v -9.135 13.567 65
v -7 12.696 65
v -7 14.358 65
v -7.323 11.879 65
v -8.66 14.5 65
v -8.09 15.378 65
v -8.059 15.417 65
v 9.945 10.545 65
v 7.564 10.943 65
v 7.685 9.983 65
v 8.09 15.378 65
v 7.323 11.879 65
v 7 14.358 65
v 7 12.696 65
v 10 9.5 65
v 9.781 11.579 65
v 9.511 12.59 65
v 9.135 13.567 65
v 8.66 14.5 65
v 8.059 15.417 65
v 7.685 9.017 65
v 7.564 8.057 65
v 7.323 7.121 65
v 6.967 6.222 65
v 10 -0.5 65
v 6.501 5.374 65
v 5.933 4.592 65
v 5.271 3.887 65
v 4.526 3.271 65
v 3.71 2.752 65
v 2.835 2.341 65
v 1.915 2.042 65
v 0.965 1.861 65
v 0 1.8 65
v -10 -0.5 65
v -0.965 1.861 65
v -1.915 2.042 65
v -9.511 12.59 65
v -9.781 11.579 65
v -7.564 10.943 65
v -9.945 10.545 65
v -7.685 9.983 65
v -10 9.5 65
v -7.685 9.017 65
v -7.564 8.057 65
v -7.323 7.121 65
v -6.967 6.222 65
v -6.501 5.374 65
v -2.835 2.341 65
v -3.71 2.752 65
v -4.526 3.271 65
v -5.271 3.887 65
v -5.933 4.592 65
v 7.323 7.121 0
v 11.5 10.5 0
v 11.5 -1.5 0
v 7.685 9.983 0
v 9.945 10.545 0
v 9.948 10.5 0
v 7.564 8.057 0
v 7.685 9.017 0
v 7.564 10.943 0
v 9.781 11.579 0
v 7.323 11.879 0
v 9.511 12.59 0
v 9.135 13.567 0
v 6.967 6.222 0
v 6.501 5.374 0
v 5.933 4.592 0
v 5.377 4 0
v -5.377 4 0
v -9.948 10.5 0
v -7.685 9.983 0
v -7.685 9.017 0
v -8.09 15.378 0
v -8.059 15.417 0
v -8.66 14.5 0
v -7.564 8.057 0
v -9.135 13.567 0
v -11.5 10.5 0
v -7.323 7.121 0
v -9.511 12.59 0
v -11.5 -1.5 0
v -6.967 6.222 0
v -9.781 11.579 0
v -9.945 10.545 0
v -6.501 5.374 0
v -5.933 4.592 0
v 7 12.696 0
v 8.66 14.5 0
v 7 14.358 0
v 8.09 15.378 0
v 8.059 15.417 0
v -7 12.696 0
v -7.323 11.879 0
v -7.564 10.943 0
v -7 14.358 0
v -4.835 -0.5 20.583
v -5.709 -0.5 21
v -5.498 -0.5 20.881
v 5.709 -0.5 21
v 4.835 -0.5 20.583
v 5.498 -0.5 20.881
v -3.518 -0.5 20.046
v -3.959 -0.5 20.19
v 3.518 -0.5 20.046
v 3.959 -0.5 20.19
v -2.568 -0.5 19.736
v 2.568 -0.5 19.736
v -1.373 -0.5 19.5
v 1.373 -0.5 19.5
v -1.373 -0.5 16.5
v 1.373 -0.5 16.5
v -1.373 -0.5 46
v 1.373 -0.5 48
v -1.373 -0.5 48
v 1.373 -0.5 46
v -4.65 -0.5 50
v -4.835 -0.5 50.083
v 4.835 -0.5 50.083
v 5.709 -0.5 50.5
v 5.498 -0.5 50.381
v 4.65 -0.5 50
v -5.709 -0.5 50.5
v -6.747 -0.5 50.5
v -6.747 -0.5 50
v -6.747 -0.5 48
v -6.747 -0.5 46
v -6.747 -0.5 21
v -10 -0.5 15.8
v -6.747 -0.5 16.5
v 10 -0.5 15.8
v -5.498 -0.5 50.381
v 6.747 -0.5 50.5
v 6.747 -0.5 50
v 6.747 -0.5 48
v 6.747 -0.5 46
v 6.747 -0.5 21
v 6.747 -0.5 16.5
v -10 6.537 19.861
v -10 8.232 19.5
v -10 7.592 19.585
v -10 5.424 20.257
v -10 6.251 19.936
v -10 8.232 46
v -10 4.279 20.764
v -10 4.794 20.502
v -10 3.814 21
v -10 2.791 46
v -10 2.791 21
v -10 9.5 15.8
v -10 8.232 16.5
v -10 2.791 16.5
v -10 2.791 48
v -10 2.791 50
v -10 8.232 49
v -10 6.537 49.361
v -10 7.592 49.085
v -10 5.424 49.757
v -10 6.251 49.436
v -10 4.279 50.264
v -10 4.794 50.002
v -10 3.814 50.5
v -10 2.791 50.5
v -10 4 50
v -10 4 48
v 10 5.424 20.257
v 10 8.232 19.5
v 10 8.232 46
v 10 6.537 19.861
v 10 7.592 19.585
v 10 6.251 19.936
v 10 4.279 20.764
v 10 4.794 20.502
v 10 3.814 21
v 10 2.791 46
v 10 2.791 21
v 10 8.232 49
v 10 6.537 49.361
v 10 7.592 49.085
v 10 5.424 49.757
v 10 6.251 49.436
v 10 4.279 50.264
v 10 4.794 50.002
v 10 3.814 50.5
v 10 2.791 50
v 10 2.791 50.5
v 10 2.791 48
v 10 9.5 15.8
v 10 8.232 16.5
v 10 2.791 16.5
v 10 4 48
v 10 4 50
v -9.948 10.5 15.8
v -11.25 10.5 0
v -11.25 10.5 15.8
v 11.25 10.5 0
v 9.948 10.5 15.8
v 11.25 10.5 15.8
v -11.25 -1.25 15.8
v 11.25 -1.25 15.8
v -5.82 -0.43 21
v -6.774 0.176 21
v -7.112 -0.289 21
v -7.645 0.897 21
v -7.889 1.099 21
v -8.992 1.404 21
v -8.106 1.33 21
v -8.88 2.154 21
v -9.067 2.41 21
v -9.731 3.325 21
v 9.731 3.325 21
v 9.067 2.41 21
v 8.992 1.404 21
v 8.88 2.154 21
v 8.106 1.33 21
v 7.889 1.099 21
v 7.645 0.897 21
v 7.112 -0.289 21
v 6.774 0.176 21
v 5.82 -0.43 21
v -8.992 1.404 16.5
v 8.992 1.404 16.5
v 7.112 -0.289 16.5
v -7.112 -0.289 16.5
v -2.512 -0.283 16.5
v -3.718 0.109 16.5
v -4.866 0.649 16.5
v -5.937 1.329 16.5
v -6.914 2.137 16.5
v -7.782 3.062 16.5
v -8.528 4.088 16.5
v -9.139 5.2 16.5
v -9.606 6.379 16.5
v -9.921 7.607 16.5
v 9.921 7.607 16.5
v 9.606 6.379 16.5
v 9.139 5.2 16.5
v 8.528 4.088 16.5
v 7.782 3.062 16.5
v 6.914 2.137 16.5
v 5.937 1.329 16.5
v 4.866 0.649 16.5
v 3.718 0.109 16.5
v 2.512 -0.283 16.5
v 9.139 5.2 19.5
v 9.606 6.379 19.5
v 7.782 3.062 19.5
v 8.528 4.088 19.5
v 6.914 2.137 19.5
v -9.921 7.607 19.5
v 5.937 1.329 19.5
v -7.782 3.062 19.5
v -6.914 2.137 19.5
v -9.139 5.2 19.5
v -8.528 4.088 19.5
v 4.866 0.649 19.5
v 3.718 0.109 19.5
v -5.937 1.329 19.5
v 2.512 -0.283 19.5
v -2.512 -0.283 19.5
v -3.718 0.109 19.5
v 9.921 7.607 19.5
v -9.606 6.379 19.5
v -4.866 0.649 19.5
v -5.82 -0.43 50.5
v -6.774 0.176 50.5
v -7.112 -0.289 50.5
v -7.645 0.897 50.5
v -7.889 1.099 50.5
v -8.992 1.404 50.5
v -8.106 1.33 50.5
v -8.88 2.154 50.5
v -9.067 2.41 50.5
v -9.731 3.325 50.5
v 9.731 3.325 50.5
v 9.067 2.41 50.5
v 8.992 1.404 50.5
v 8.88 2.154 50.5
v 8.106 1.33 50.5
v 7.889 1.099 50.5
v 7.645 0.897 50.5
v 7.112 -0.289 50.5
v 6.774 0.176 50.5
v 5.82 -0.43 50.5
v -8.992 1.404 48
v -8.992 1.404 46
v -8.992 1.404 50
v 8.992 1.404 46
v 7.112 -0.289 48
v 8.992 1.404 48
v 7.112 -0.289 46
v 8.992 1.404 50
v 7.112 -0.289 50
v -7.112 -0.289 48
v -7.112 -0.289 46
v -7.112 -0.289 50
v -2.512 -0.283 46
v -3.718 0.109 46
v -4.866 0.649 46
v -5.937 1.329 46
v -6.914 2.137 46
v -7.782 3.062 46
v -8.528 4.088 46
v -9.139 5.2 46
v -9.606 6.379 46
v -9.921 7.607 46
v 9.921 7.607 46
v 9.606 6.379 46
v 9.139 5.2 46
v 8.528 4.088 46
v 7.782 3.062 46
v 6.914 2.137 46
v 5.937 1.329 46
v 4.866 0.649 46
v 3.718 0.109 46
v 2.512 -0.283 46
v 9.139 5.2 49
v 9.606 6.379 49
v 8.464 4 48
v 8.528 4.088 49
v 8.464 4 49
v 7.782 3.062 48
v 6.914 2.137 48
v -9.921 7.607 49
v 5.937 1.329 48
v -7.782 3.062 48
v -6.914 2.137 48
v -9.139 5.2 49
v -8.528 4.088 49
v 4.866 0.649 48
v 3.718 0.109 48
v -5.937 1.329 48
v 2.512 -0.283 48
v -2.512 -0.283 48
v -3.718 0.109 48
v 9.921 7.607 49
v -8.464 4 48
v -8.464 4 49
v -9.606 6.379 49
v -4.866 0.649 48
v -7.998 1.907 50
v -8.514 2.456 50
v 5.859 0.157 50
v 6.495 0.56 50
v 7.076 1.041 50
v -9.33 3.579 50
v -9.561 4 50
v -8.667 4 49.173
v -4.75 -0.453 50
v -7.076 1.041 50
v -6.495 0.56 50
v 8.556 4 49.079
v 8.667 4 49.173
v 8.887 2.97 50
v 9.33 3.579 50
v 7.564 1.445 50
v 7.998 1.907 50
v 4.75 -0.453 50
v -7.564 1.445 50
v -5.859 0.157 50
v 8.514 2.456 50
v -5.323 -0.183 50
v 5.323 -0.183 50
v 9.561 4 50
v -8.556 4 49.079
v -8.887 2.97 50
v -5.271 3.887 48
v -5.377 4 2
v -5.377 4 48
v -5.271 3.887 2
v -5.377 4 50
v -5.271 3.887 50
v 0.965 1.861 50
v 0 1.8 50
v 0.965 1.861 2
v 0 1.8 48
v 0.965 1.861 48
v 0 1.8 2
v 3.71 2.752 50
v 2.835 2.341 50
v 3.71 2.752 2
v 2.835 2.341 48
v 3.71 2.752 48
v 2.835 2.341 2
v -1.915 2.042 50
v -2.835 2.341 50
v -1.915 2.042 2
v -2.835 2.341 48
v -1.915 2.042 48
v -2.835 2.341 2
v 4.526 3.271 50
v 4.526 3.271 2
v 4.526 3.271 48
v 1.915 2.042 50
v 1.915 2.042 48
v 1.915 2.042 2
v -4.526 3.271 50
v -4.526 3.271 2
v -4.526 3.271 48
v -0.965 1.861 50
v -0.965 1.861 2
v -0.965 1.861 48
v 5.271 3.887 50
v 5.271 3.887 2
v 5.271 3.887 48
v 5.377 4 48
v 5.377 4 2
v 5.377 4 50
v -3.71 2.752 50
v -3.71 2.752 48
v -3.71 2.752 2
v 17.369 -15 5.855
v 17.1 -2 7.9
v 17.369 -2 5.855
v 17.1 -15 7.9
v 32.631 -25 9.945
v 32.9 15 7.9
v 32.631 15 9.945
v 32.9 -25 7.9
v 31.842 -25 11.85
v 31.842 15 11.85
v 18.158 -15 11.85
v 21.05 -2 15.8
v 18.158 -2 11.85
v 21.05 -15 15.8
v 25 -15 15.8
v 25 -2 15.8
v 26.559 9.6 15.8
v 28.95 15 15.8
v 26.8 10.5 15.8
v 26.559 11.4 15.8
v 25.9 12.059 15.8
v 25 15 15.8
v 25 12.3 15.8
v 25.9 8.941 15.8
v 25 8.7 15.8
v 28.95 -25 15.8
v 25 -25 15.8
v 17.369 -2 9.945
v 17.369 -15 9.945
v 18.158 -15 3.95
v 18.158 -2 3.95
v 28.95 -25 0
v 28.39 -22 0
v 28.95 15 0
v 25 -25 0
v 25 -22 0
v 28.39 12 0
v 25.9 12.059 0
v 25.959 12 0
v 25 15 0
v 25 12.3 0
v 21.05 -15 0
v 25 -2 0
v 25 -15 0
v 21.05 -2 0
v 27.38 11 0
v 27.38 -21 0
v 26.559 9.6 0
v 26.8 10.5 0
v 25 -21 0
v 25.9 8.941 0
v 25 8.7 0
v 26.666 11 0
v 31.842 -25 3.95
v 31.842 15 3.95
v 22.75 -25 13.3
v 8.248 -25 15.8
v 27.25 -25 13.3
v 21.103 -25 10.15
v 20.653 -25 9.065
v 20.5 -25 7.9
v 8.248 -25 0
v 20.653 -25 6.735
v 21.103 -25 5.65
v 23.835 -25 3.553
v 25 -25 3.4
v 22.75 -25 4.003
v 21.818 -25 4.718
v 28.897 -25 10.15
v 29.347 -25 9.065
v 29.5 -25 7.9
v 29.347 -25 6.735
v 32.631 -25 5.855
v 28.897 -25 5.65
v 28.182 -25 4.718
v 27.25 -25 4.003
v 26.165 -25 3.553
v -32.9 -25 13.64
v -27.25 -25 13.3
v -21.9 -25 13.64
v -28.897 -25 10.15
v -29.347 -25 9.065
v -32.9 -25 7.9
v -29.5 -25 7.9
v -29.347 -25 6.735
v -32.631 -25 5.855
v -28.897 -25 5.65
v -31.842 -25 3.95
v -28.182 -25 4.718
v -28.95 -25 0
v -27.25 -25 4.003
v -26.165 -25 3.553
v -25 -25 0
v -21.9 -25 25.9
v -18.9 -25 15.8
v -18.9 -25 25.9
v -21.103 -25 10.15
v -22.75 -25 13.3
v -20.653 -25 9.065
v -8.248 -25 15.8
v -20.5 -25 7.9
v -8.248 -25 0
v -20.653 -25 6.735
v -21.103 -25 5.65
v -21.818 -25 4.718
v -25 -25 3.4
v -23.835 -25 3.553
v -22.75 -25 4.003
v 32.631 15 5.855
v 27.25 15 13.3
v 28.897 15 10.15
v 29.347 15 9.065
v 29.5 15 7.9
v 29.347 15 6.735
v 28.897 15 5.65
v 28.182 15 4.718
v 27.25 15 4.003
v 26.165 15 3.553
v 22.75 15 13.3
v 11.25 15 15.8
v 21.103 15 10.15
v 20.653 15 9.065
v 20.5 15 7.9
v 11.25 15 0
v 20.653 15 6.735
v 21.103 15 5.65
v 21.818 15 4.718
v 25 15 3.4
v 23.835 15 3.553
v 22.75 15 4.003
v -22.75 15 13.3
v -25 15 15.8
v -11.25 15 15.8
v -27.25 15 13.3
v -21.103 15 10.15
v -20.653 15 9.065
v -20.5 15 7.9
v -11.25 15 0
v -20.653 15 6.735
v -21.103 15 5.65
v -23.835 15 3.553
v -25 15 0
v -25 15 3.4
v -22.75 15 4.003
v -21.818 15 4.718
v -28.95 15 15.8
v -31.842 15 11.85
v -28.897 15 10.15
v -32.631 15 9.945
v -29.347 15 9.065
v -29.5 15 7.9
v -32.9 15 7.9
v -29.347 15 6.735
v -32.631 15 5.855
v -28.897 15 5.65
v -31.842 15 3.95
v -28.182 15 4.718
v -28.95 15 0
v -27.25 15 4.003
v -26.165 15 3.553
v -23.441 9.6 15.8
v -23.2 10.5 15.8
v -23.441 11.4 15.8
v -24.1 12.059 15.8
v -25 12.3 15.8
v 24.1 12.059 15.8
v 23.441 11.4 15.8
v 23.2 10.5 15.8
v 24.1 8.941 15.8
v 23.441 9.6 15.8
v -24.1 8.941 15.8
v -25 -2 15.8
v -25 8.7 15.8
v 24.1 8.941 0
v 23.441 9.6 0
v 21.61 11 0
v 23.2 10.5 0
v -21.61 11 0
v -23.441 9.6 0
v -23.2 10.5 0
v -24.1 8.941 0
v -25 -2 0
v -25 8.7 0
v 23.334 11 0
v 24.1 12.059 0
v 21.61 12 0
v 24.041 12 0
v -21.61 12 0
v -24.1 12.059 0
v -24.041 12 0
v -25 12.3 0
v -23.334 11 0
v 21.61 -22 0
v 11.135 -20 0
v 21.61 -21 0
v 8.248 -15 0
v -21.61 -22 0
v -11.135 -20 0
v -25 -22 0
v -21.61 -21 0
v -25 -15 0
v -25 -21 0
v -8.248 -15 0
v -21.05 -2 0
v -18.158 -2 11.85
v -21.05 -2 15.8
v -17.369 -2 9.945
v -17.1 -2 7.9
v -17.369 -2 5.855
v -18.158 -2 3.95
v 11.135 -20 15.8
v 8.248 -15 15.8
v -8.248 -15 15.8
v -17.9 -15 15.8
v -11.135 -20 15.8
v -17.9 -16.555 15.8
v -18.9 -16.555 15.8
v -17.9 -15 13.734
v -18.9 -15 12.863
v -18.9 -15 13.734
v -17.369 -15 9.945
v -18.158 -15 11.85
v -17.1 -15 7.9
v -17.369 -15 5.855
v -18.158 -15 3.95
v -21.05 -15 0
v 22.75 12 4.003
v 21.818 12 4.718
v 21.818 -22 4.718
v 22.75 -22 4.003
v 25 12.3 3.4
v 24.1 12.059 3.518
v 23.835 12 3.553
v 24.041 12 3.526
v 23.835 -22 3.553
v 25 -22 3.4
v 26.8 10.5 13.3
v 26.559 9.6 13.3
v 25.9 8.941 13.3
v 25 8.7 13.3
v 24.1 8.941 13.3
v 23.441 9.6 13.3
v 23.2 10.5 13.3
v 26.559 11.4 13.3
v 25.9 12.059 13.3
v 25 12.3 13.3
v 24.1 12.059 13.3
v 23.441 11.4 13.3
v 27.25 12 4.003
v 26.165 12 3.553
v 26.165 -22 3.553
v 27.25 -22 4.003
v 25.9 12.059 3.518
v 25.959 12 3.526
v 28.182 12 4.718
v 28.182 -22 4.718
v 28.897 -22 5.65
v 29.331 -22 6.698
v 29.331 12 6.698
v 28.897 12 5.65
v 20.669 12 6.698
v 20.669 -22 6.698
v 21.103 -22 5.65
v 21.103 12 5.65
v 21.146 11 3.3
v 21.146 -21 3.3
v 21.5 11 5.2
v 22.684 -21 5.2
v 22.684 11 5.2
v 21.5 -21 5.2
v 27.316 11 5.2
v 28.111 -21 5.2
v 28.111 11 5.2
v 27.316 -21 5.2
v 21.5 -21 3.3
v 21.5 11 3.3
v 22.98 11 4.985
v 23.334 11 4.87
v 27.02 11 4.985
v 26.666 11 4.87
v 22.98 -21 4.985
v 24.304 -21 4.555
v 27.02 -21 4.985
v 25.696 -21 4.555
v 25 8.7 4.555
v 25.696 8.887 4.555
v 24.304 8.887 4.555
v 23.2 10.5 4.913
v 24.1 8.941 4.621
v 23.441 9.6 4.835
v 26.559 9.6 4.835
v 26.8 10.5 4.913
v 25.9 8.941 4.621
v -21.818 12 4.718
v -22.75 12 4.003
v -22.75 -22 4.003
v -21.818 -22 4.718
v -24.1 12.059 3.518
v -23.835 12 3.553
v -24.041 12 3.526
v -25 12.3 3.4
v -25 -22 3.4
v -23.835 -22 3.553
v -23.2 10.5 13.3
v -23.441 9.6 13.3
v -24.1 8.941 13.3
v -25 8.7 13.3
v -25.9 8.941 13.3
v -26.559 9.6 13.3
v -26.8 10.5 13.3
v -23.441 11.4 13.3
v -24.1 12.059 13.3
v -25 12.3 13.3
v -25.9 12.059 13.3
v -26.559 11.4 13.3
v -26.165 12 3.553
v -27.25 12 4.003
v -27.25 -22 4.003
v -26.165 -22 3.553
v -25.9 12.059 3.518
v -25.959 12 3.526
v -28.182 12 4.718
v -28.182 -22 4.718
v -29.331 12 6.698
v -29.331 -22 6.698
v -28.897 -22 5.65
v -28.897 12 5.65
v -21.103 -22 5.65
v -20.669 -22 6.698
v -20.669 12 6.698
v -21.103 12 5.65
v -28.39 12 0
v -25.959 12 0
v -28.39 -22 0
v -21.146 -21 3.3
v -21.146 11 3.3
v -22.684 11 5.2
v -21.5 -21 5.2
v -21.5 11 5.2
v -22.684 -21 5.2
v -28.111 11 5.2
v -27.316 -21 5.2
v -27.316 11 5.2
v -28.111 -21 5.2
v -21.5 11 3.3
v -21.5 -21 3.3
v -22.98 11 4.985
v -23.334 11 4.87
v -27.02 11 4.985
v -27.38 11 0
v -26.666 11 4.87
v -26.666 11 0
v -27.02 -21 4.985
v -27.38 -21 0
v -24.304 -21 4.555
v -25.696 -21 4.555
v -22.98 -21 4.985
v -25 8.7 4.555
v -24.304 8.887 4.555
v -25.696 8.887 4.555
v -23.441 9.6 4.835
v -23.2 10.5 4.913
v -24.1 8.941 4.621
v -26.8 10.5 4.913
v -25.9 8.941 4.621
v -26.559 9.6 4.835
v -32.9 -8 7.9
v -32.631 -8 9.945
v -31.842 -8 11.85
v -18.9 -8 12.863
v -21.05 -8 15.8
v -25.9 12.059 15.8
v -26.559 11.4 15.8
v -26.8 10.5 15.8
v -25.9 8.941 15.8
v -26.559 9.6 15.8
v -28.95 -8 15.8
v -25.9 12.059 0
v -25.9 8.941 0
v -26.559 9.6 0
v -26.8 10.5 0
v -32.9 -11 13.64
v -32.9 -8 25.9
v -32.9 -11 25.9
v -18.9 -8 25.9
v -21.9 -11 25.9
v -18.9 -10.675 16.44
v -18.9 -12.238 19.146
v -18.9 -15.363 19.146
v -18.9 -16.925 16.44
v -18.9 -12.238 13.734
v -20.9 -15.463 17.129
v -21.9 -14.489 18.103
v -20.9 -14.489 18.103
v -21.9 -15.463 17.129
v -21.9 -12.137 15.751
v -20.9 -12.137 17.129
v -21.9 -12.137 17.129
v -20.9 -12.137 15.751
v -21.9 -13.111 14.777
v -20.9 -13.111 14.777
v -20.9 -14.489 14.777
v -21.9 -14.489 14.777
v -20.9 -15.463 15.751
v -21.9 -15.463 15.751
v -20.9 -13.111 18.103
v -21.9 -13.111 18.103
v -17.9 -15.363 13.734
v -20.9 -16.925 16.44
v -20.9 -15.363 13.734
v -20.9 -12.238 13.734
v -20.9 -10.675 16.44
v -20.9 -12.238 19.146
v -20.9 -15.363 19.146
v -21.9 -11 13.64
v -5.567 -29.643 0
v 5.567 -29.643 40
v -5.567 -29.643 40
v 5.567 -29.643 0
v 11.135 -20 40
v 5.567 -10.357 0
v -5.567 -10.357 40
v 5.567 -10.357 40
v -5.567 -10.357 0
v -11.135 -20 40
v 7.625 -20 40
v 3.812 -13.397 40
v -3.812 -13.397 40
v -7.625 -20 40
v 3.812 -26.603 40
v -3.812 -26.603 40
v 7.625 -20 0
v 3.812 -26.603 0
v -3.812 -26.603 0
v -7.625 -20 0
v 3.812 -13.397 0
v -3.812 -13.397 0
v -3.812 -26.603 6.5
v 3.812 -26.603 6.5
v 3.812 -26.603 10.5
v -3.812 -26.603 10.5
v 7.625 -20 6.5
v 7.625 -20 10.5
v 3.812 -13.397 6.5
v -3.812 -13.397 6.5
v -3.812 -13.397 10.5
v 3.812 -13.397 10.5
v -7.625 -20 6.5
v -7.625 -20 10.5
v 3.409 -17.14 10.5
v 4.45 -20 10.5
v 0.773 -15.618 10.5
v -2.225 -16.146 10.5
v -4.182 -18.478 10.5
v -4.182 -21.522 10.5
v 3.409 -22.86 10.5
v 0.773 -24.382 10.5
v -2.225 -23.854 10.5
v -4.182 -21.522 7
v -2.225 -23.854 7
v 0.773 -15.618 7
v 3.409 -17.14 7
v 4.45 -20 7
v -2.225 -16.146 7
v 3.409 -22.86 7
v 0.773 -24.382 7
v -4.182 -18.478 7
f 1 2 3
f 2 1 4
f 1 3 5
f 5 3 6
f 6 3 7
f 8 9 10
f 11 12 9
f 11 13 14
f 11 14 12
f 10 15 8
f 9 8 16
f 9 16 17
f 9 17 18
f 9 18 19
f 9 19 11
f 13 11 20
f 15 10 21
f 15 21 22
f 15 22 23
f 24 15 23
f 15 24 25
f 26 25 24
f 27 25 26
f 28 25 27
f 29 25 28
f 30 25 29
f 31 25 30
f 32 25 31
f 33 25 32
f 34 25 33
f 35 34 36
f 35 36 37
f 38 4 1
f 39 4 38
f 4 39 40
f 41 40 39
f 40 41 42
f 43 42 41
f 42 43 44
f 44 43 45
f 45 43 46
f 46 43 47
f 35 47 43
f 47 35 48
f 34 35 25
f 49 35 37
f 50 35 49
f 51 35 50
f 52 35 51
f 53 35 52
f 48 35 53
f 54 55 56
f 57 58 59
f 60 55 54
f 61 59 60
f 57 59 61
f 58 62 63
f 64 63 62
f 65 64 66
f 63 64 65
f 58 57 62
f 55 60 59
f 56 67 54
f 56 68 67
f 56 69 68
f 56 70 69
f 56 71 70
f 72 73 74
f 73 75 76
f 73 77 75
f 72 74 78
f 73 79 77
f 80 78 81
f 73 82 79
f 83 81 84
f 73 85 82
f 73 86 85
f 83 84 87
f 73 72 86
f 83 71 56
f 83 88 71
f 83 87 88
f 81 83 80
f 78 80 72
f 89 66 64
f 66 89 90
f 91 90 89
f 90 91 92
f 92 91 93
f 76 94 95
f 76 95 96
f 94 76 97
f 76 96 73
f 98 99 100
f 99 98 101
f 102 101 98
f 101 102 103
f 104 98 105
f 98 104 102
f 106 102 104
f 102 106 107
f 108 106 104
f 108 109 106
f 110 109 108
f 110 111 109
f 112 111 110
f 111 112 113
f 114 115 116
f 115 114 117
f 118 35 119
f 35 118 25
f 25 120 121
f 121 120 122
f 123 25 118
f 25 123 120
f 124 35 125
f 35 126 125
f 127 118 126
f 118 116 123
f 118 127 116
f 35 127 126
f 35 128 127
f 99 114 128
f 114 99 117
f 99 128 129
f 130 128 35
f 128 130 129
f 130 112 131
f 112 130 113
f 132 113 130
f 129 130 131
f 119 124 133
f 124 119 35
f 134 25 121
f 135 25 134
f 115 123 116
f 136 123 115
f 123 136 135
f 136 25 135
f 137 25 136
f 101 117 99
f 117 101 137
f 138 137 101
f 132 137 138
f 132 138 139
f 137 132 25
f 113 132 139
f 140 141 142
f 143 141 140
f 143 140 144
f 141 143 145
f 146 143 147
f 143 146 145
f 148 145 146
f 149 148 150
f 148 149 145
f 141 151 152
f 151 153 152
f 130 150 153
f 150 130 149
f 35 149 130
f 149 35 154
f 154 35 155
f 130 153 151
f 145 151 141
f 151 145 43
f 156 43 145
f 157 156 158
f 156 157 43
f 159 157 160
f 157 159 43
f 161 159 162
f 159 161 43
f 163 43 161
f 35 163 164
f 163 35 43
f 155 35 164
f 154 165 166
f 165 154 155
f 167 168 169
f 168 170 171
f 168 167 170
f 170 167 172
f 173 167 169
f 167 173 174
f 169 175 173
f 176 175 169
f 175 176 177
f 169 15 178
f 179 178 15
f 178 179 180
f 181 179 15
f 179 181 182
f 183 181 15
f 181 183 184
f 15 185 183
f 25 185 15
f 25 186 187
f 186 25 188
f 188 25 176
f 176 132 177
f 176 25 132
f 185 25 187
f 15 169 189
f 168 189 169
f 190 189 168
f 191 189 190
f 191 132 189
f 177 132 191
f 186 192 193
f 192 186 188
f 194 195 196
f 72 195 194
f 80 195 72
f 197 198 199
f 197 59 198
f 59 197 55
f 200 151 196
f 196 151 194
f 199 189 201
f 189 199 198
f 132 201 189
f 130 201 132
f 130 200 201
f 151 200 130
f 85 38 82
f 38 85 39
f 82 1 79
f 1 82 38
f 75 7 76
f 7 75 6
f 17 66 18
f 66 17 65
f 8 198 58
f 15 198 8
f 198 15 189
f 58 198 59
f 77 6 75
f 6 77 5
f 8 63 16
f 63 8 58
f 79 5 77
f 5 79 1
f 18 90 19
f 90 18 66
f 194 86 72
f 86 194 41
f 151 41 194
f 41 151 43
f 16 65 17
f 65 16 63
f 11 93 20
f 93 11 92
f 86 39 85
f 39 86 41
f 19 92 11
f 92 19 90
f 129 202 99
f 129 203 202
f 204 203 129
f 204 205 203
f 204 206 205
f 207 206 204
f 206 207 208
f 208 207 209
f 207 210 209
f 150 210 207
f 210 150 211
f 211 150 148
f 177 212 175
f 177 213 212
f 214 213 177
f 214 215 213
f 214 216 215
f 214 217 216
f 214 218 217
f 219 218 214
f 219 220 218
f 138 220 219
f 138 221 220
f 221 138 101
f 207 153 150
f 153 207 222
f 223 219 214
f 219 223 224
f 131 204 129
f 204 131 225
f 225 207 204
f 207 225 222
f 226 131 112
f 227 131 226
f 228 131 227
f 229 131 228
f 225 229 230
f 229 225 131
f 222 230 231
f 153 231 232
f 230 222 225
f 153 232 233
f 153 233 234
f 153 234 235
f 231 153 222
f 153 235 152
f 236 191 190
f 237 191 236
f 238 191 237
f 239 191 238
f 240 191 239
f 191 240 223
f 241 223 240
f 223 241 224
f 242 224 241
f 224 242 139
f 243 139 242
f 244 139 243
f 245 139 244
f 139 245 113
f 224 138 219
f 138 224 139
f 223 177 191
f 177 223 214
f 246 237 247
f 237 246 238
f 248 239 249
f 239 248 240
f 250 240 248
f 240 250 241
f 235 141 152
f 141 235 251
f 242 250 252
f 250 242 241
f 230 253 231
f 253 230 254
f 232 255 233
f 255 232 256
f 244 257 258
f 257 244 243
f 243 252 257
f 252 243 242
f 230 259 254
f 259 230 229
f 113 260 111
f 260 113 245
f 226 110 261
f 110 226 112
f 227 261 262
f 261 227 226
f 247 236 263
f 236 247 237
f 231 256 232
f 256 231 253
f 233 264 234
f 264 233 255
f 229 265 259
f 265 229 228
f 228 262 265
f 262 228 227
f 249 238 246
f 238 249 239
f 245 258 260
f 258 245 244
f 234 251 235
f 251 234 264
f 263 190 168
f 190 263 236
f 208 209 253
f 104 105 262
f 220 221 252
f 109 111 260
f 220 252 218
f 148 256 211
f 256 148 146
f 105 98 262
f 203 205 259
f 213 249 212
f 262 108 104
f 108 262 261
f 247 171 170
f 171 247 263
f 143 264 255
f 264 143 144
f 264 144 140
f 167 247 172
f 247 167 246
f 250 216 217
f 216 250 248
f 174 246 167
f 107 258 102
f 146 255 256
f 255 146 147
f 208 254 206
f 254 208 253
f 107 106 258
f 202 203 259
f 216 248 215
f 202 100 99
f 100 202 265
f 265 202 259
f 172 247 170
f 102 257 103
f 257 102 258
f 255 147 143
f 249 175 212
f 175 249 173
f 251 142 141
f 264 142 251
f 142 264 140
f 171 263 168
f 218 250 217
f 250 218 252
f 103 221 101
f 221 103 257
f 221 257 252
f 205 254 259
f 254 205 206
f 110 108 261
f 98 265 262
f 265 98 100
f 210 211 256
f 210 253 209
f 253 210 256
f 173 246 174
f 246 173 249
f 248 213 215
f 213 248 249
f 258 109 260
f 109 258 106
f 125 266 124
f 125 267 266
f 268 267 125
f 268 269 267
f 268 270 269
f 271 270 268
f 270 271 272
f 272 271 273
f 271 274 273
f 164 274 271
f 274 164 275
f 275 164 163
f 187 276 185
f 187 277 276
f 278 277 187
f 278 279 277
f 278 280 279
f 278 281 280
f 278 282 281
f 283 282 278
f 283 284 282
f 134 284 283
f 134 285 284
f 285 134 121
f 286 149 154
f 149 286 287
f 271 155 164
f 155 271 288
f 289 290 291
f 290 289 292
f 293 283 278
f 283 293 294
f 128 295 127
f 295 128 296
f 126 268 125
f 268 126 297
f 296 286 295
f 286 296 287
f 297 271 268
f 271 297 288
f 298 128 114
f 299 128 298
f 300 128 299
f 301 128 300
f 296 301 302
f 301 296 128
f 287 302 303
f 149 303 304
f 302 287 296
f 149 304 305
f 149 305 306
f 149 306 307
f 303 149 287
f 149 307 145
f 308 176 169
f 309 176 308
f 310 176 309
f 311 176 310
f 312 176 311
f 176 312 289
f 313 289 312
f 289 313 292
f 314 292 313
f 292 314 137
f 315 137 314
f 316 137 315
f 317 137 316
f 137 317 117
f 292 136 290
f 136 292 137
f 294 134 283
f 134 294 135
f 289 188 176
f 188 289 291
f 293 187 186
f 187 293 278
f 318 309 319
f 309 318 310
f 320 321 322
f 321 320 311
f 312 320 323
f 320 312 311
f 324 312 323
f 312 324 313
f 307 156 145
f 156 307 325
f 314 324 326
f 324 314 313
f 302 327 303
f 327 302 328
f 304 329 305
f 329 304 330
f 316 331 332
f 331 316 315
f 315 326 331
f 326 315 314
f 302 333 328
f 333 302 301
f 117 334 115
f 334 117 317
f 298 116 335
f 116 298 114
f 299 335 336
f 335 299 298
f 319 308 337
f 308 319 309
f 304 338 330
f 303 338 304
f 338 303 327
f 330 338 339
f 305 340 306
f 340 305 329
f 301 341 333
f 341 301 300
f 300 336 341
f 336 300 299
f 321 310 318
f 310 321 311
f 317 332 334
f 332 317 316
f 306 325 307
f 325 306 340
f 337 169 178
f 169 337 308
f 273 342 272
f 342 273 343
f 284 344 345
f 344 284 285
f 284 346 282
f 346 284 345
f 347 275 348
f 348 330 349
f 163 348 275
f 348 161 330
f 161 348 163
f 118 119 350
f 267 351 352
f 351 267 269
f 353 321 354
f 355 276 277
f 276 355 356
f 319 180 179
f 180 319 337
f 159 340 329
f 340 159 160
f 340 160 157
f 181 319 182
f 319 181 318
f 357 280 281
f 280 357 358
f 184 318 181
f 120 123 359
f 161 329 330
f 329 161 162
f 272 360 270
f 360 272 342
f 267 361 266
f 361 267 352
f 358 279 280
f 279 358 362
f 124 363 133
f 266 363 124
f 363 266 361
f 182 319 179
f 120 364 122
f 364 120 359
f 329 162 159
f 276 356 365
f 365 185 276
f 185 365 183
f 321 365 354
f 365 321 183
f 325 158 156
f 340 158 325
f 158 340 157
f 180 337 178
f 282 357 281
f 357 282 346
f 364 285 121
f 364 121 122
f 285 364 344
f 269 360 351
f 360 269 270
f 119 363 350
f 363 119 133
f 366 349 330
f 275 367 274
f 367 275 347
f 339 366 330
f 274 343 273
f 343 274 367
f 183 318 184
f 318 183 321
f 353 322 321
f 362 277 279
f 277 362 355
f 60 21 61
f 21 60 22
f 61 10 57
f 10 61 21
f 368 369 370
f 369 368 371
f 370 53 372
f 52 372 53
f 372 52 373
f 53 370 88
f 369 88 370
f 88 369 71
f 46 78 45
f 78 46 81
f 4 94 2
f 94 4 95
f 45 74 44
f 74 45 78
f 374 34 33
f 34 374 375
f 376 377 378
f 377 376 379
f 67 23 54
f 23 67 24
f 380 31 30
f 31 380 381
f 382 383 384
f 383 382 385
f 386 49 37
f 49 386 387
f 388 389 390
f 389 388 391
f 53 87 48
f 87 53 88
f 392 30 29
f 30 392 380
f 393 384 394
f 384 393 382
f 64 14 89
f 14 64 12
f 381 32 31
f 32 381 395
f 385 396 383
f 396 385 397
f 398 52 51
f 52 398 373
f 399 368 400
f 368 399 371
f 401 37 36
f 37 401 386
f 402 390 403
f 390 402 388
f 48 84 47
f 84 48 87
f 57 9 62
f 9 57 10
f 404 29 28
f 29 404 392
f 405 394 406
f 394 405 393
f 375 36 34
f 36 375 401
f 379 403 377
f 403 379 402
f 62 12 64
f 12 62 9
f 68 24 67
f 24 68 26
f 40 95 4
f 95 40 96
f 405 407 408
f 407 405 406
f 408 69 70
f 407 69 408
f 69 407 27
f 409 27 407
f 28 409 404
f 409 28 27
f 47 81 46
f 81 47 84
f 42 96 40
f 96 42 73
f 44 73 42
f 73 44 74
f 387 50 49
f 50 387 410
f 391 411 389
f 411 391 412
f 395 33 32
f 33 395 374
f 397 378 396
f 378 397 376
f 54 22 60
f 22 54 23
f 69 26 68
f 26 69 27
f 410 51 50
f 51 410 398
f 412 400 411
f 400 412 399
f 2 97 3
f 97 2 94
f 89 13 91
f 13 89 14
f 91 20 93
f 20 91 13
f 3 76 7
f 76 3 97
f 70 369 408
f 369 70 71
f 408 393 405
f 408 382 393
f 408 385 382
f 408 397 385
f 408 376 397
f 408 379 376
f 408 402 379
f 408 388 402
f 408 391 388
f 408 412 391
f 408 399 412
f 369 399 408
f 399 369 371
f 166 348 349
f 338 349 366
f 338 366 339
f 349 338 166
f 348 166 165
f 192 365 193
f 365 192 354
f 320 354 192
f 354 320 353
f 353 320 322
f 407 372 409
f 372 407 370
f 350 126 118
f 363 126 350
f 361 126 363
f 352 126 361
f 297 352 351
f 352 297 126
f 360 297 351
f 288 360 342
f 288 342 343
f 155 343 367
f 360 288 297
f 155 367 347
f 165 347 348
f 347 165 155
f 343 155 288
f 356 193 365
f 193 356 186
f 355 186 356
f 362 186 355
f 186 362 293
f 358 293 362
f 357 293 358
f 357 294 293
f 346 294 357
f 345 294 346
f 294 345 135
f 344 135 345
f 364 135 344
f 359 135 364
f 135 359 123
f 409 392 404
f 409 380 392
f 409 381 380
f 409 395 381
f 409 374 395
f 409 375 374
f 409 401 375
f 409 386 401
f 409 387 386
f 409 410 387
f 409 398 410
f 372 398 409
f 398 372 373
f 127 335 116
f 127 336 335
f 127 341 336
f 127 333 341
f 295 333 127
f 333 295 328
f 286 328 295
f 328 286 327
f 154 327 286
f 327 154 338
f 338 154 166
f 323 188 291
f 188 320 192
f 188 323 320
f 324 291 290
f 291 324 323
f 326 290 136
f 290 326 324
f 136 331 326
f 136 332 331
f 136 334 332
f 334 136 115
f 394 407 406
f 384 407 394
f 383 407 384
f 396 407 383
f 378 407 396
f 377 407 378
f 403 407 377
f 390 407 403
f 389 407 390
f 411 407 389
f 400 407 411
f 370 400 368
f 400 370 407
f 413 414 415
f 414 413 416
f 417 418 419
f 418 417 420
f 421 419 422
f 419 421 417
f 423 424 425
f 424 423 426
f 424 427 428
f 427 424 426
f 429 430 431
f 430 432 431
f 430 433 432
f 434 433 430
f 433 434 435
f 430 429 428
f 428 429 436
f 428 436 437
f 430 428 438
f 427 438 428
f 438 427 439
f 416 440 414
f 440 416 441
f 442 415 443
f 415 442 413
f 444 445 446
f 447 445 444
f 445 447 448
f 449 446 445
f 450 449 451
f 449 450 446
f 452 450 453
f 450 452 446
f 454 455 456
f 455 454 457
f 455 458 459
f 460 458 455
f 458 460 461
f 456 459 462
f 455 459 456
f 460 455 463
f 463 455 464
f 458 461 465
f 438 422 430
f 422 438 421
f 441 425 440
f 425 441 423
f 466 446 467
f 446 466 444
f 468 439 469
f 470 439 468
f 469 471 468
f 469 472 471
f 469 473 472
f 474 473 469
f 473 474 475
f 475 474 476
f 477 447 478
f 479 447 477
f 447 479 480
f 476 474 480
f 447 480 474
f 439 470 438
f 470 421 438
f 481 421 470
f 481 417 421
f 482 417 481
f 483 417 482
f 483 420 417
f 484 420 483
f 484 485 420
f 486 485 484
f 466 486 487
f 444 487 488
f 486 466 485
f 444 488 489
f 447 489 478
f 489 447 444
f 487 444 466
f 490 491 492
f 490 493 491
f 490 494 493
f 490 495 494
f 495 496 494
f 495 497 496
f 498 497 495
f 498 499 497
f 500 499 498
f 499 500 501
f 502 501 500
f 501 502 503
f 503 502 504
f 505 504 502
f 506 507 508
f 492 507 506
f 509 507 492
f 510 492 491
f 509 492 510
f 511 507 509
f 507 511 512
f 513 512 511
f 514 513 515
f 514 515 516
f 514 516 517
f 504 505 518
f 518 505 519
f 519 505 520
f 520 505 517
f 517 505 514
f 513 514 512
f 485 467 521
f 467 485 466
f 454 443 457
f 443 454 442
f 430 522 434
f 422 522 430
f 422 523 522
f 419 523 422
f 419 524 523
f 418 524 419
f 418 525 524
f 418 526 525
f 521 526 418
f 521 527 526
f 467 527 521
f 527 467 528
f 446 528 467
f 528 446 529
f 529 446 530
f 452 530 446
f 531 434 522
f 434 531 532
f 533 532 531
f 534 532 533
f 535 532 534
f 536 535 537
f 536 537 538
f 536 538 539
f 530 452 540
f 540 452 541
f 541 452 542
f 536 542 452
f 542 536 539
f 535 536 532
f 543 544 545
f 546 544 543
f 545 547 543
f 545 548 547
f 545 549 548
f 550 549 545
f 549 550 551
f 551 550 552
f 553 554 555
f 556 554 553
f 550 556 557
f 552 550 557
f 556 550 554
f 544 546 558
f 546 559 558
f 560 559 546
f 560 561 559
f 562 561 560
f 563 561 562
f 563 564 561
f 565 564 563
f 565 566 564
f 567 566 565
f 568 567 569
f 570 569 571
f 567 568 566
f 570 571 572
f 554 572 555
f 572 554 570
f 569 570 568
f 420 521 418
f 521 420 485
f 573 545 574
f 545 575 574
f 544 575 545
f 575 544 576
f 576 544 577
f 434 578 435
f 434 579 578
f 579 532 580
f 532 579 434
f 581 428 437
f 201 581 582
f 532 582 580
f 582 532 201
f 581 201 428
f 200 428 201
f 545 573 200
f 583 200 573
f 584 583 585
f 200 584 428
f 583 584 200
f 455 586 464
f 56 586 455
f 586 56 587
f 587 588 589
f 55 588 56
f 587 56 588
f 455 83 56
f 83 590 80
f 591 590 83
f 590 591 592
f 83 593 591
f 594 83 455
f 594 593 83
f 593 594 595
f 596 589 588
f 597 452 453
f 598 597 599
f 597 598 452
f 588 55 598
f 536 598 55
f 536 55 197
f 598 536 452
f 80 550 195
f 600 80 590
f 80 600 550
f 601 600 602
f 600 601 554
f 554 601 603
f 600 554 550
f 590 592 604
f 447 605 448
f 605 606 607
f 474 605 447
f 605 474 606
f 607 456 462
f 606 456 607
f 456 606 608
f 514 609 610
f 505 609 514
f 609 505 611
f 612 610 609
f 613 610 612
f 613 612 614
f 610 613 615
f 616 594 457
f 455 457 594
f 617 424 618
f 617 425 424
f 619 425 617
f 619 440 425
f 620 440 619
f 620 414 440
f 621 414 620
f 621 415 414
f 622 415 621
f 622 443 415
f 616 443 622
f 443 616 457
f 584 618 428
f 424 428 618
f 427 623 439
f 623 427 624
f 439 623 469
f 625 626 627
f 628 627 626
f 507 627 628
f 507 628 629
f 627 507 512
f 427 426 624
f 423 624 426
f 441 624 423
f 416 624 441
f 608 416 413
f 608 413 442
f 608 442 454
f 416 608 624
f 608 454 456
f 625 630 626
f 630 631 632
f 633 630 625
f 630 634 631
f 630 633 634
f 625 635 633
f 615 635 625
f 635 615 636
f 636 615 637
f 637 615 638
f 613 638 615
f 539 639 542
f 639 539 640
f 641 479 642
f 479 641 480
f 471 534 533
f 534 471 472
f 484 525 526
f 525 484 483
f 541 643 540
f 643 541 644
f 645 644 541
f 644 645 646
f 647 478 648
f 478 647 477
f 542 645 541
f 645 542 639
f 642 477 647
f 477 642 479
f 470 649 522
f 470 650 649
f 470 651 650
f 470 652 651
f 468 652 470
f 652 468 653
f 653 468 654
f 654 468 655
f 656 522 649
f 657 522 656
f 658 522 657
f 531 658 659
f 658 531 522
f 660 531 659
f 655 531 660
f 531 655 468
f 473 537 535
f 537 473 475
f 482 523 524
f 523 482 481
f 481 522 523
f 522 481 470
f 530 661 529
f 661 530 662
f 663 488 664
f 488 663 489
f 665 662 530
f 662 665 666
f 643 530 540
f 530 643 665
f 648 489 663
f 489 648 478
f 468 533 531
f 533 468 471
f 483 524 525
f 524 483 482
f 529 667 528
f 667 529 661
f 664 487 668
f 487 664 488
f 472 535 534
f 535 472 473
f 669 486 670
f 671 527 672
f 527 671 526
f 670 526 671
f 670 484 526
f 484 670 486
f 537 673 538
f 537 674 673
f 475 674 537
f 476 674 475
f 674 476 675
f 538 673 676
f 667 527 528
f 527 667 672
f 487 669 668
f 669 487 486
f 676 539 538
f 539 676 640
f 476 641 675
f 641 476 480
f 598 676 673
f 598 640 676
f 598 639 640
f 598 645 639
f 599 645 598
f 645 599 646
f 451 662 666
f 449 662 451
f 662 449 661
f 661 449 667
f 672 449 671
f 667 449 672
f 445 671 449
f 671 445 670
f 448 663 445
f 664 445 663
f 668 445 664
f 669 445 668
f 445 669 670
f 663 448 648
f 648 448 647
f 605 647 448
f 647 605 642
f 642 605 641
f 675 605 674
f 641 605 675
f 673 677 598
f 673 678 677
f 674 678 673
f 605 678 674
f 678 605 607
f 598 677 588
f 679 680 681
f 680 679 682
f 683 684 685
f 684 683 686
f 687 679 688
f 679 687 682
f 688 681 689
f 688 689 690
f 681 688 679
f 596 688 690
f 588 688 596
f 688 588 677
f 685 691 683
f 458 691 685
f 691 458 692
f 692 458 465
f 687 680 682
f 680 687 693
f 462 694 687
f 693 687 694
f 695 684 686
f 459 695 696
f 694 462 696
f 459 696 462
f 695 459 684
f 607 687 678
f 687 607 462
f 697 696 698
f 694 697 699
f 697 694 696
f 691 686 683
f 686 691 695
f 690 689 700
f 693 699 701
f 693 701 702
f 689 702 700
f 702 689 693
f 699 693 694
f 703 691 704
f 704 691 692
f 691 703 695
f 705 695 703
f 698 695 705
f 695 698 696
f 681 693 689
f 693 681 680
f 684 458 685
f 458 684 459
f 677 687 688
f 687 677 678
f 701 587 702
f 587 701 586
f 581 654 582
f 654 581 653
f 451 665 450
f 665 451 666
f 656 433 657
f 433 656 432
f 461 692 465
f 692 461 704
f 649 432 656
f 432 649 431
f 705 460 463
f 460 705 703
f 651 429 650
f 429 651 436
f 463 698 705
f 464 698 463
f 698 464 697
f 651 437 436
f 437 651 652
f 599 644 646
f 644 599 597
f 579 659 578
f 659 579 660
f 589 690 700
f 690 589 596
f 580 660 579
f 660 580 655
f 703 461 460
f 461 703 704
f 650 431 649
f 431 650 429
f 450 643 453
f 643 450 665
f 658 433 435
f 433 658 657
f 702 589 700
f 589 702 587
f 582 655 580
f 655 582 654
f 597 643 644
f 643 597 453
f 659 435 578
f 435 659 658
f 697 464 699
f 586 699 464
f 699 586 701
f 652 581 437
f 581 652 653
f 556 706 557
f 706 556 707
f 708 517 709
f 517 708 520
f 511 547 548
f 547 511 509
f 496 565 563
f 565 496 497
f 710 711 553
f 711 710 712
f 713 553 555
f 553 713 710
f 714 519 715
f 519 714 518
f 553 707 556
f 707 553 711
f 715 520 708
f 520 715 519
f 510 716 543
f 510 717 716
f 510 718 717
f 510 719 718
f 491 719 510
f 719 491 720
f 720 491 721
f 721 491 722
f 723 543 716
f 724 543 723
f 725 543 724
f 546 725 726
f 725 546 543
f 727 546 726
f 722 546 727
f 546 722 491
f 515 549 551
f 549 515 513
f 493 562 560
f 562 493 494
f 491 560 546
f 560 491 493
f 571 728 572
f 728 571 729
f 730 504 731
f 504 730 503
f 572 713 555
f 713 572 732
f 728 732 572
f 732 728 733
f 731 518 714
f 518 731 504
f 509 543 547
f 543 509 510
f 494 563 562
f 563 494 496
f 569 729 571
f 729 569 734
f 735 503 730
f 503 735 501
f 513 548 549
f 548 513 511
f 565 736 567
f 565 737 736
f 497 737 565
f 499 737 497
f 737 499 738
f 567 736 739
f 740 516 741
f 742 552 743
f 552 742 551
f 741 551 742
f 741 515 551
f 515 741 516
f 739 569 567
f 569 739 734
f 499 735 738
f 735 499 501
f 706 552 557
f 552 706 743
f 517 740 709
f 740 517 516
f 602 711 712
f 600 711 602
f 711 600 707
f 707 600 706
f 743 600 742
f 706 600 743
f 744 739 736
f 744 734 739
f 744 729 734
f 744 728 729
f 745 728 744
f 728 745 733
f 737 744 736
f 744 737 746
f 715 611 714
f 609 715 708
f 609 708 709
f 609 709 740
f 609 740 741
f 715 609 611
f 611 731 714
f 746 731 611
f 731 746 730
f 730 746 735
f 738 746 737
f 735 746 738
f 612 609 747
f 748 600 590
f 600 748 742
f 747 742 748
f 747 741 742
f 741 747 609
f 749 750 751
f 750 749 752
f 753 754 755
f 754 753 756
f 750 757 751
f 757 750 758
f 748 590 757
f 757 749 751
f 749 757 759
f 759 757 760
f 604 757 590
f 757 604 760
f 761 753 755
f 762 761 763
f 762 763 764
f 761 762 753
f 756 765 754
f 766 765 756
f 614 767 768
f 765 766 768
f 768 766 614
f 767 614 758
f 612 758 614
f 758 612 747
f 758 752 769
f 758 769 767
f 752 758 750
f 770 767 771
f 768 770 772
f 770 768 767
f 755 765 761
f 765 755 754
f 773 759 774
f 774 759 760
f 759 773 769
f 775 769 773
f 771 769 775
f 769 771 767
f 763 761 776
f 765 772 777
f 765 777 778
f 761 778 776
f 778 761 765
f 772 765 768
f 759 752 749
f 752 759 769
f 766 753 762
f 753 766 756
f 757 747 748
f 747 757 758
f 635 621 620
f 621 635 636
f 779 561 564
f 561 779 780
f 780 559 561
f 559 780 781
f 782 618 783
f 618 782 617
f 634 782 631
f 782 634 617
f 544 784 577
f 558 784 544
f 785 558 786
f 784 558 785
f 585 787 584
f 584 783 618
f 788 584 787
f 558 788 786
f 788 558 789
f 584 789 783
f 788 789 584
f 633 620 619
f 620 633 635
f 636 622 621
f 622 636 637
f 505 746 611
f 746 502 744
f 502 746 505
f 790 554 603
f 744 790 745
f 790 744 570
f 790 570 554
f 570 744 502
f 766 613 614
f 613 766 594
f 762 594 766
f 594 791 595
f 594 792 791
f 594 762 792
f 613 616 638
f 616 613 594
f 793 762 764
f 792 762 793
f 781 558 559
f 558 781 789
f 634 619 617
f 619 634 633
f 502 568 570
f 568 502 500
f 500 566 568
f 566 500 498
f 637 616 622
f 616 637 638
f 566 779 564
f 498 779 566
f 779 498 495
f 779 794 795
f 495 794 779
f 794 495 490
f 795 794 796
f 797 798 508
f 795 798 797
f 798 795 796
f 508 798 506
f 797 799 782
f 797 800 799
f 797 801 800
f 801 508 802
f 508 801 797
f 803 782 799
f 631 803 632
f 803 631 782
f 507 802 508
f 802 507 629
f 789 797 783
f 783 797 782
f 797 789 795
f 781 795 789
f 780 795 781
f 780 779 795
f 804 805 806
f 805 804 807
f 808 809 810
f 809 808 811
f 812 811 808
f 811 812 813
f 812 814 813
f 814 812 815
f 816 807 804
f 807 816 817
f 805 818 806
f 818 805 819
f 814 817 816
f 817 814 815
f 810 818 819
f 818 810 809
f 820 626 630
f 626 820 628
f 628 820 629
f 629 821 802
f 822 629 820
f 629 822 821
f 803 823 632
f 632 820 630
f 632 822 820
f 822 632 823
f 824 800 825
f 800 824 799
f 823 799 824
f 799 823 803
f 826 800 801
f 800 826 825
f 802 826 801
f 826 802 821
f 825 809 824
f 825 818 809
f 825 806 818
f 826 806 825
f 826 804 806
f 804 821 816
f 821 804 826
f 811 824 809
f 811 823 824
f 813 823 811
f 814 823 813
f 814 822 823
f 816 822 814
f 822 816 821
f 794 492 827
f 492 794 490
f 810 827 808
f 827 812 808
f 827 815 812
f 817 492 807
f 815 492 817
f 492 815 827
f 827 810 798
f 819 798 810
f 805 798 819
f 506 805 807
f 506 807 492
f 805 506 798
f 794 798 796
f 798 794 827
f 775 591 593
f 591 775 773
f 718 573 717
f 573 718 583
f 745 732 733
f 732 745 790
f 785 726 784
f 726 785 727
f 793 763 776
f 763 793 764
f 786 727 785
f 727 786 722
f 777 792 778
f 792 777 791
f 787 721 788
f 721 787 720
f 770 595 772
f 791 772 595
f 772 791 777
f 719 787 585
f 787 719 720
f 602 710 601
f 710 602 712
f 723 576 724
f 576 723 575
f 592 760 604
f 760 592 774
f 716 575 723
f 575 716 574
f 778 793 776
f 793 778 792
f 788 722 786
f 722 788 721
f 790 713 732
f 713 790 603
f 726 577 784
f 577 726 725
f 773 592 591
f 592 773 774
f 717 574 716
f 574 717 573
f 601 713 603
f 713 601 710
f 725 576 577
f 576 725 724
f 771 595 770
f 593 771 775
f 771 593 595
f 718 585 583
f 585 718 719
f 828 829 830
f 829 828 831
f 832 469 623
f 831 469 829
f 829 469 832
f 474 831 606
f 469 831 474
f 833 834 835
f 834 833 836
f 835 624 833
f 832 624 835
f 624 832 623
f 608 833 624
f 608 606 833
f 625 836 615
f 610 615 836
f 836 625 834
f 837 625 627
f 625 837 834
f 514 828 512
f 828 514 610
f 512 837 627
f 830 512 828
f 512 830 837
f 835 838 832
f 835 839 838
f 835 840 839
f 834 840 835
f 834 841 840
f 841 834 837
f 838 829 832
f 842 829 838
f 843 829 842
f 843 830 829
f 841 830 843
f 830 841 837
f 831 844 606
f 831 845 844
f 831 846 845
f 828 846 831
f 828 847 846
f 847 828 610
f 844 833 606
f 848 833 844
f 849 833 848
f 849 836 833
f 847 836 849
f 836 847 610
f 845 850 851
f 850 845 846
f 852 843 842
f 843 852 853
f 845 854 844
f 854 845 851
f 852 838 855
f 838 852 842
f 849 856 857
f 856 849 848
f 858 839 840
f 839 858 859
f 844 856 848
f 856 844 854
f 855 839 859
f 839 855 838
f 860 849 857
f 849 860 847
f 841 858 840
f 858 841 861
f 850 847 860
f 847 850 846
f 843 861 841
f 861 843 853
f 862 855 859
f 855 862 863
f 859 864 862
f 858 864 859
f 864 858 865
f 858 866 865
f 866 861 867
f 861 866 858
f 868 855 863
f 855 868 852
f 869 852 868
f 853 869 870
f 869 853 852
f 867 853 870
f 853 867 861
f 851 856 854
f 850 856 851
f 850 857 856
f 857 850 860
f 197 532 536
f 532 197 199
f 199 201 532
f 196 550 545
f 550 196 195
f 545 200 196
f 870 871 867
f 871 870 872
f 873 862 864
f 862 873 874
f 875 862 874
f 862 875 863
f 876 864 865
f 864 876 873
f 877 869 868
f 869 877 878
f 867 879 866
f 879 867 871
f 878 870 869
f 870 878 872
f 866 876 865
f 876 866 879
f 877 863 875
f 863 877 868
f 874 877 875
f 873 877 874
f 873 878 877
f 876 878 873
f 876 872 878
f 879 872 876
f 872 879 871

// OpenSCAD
// file: functions.scad
// PRUSA Mendel  
// Functions used in many files
// GNU GPL v2
// Josef Průša
// josefprusa@me.com
// prusadjs.cz
// http://www.reprap.org/wiki/Prusa_Mendel
// http://github.com/prusajr/PrusaMendel

module nut(d,h,horizontal=true){
cornerdiameter =  (d / 2) / cos (180 / 6);
cylinder(h = h, r = cornerdiameter, $fn = 6);
if(horizontal){
for(i = [1:6]){
	rotate([0,0,60*i]) translate([-cornerdiameter-0.2,0,0]) rotate([0,0,-45]) cube(size = [2,2,h]);
}}
}

// By nophead
module polyhole(d,h) {
    n = max(round(2 * d),3);
    rotate([0,0,180])
        cylinder(h = h, r = (d / 2) / cos (180 / n), $fn = n);
}




module roundcorner(diameter){
	difference(){
		cube(size = [diameter,diameter,99], center = false);
		translate(v = [diameter, diameter, 0]) cylinder(h = 100, r=diameter, center=true);
	}
}
// file: metric.scad
// PRUSA Mendel  
// Default metric sizes
// GNU GPL v2
// Josef Průša
// josefprusa@me.com
// prusadjs.cz
// http://www.reprap.org/wiki/Prusa_Mendel
// http://github.com/prusajr/PrusaMendel

// DONT CHANGE THIS FILE! ALTER VALUES IN CONFIGURATION.SCAD INSTEAD

// RODS

threaded_rod_diameter = 8.2;
threaded_rod_diameter_horizontal = 8.2;
smooth_bar_diameter = 8;
smooth_bar_diameter_horizontal = 8.5;

// Nuts and bolts

m8_diameter = 8.9;
m8_nut_diameter = 15.25;

m4_diameter = 4.5;
m4_nut_diameter = 9;

m3_diameter = 3.6;
m3_nut_diameter = 6.25;
m3_nut_heigth = 2.3;
m3_nut_wallDist = cos(30)*m3_nut_diameter;
m3_nut_diameter_horizontal = 6.1;

// Bushing holder

bushing_core_diameter = smooth_bar_diameter;
bushing_material_thickness = 1;

// Motors

motor_shaft = 5.5;
// file: teardrop.scad
teardrop();

module teardrop (r=4.5,h=20,top_and_bottom=false)
{
	rotate([-270,0,90])
	linear_extrude(height=h,convexity=10)
	{
		circle(r=r, $fn = 24);
		polygon(points=[[0,0],[r*cos(30),r*sin(30)],[0.5*r,r],[-0.5*r,r],[-r*cos(30),r*sin(30)]],
				paths=[[0,1,2,3,4]]);
		if (top_and_bottom)
		polygon(points=[[0,0],[r*cos(30),-r*sin(30)],[0.5*r,-r],[-0.5*r,-r],[-r*cos(30),-r*sin(30)]],
				paths=[[0,1,2,3,4]]);
		
	}
}

module teardropcentering (r=4.5,h=20)
{
	rotate([-270,0,90])
	linear_extrude(height=h)
	{
		circle(r=r, $fn = 24);
		polygon(points=[[0,0],[r*cos(30),r*sin(30)],[0.5*r,1.2*r],[-0.5*r,1.2*r],[-r*cos(30),r*sin(30)]],
				paths=[[0,1,2,3,4]]);
	}
}

module teardropcentering2 (r=4.5,h=20)
{
	//rotate([-270,0,90])
	difference(){
	linear_extrude(height=h)
	{
		circle(r=r, $fn = 24);
		polygon(points=[[0,0],[r*cos(30),r*sin(30)],[0.5*r,1.2*r],[-0.5*r,1.2*r],[-r*cos(30),r*sin(30)]],
				paths=[[0,1,2,3,4]]);
	}
	translate(v = [-1.5*r, -1.5*r,-1])cube(size =[3*r,1.5*r,h+2]);
	}
}
// file: bushing.scad
// PRUSA Mendel  
// Bushings
// GNU GPL v2
// Josef Průša
// josefprusa@me.com
// prusadjs.cz
// http://www.reprap.org/wiki/Prusa_Mendel
// http://github.com/prusajr/PrusaMendel

include <configuration.scad>

/**
 * @id bushing
 * @name Bushing
 * @category Printed
 * @id bushing
 */ 

z_linear_bearings(luu_version=true);

luu_height=45;
uu_height=24;

module z_linear_bearings(luu=false,override_height=-1)
{
translate(v=[0,9.5,0]) rotate(a=[0,0,90])
assign (height=(override_height>0)?override_height:luu_version?luu_height+4+1:65)
{
	
	difference()
	{
		union()
		{
			//main block
			translate([-5,0,height/2]) cube([10,20,height],center=true);
			//holder for main block in x-end
			translate([-5,0,15.8/2]) cube([12,23,15.8],center=true);
			translate([0,0,0]) cylinder(h=height,r=10,$fn=60);
		}
		//main axis
		translate([0,0,-2]) cylinder(h=height+5, r=7.7, $fn=50);
		//main cut
		translate([10,0,height/2]) cube([20,14,height+5],center=true);
		//smooth entry cut
		translate([12,0,height/2]) rotate([0,0,45]) cube([20,20,height+5],center=true);
		translate([0,0,14.5+2]) ziptie();
		translate([0,0,height-(12+2)-5]) ziptie();
	}
	if (luu_version)
	{
	translate([-(10-5.5)/2-5.5,0,0+1]) cube([10-5.5,20,2], center = true);
	translate([-(10-5.5)/2-5.5,0,luu_height+1+2+1]) cube([10-5.5,20,2], center = true);
	}
	else
	{
	translate([-(10-5.5)/2-5.5,0,0+1]) cube([10-5.5,20,2], center = true);
	translate([-(10-5.5)/2-5.5,0,uu_height+1+2+1]) cube([10-5.5,20,2], center = true);
	
	translate([-(10-5.5)/2-5.5,0,65-1]) cube([10-5.5,20,2], center = true);
	translate([-(10-5.5)/2-5.5,0,65-uu_height-1-2-1]) cube([10-5.5,20,2], center = true);
	}
}
}

//ziptie();

module ziptie(){
difference(){
translate(v=[0,0,0]) cylinder(h = 4.5, r=12.1);
translate(v=[0,0,-1]) cylinder(h = 5, r=10.1, $fn=50);
translate(v=[0,0,3]) cylinder(h = 2, r1=10.1, r2=12, $fn=50);
}}
// file: configuration.scad
// PRUSA Mendel  
// Configuration file
// GNU GPL v2
// Josef Průša
// josefprusa@me.com
// prusadjs.cz
// http://www.reprap.org/wiki/Prusa_Mendel
// http://github.com/prusajr/PrusaMendel

// PLEASE SELECT ONE OF THE CONFIGURATIONS BELOW
// BY UN-COMMENTING IT

// Uncomment for metric settings
// METRIC METRIC METRIC METRIC METRIC METRIC METRIC METRIC 

include <metric.scad>;

// Uncomment for imperial settings
// IMPERIAL IMPERIAL IMPERIAL IMPERIAL IMPERIAL IMPERIAL IMPERIAL 

//include <sae.scad>;

// CUSTOM CUSTOM CUSTOM CUSTOM CUSTOM CUSTOM CUSTOM CUSTOM CUSTOM

thin_wall = 3;

// LM8UU
linear = false;


// CHANGE ONLY THE STUFF YOU KNOW
// IT WILL REPLACE DEFAULT SETTING

// RODS

// threaded_rod_diameter = 0;
// threaded_rod_diameter_horizontal = 0;
// smooth_bar_díameter = 0;
// smooth_bar_díameter_horizontal = 0;

// Nuts and bolts

// m8_diameter = 0;
// m8_nut_diameter = 0;

// m4_diameter = 0;
// m4_nut_diameter = 0;

// m3_diameter = 0;
// m3_nut_diameter = 0;

// Bushing holder

// bushing_core_diameter = smooth_bar_díameter;
// bushing_material_thickness = 0;


///counted stuff
m3_nut_diameter_bigger = ((m3_nut_diameter  / 2) / cos (180 / 6))*2;

// functions 
include <functions.scad>
// main file
// PRUSA Mendel  
// X-end prototype for
// GNU GPL v2
// Josef Průša
// josefprusa@me.com
// prusadjs.cz
// http://www.reprap.org/wiki/Prusa_Mendel
// http://github.com/prusajr/PrusaMendel

include <configuration.scad>
corection = 1.17; 
use <bushing.scad>
use <teardrop.scad>

axis_diameter_real=4;
axis_diameter_larger=4.5;
add_strength=false;
xend_height=15.8;
xend_length=40;
solid_end_width=3;
slot_width=1;

pad_height=5.2;
pad_width=7;
pad_connector_height=3.3;
bushing_support_width=17;
rod_support_width=10;
pad_groove_depth=0.7;

module xend_side(closed_end=true,curved_sides=false,endstop_mount=false)
{
//	translate([25,0,0])
//	difference()
//	{
//		endstop_mount();
//		endstop_holes();
//	}

	translate([25,0,0])
	render()
	difference ()
	{
		union()
		{
			if (curved_sides)
			{
				rotate(90) 
				teardrop(r=xend_height/2,h=xend_length,top_and_bottom=true);
			}
			else
			{
				difference ()
				{
					translate([0,xend_length/2,0])
					cube([xend_height,xend_length,xend_height],center=true);
	
					for (i=[0:1])
					translate([0,xend_length/2,0])
					rotate(i*180)
					{
						translate([-12,0,2]) 
						rotate([0,25,0]) 
						cube([10,xend_length+2,20],center=true);
	
						translate([-13,0,0]) rotate([0,-10,0]) 
						cube([10,xend_length+2,20],center=true);
					}
				}
			}

			translate([-26,xend_length-bushing_support_width,-xend_height/2])
			cube([26,bushing_support_width,xend_height]);

			translate([-26,0,-xend_height/2])
			cube([26,rod_support_width,xend_height]);

			if (endstop_mount)
				endstop_mount();
		}

		render();
		difference ()
		{
			union ()
			{
				translate([0,-1,0])
				rotate(90)
				teardropcentering(
					axis_diameter_larger,
					closed_end?xend_length-solid_end_width+1:xend_length+2);
	
				translate([axis_diameter_larger,0,0])
				rotate([0,8,0])
				translate([-axis_diameter_larger,solid_end_width,-xend_height/2-1])
				cube([axis_diameter_larger,
					xend_length-2*solid_end_width,
					xend_height/2+1]);
	
				translate([-axis_diameter_larger,0,0])
				rotate([0,-8,0])
				translate([0,solid_end_width,-xend_height/2-1])
				cube([axis_diameter_larger,
					xend_length-2*solid_end_width,
					xend_height/2+1]);
	
				if (closed_end)
				{
					translate([0,xend_length-solid_end_width+1.5,0])
					rotate([90,0,0])
					cylinder(r=m3_nut_diameter/2, h=3,$fn=6);
	
					translate([0,xend_length+1,0])
					rotate([90,0,0])
					cylinder(r=m3_diameter/2-0.2, h=solid_end_width+2,$fn=6);
				}	
			}

			translate([-axis_diameter_larger-1,solid_end_width+slot_width,-xend_height/2])
			cube([axis_diameter_larger,
				xend_length-2*solid_end_width-2*slot_width,
				pad_connector_height]);

			difference()
			{
				translate([-pad_width/2,solid_end_width+slot_width,-xend_height/2])
				cube([pad_width,
					xend_length-2*solid_end_width-2*slot_width,
					pad_height]);
				
				translate([0,solid_end_width+slot_width-1,-xend_height/2+pad_height+m8_diameter/2-pad_groove_depth])
				rotate([-90,0,0])
				rotate(180/20)
				cylinder(r=m8_diameter/2,h=xend_length-2*solid_end_width-2*slot_width+2,$fn=20);

				translate([axis_diameter_larger,0,0])
				rotate([0,8,0])
				translate([-slot_width,solid_end_width,-xend_height/2-1])
				cube([slot_width,xend_length-2*solid_end_width,xend_height/2+1]);
			}
		}

		if (endstop_mount)
			endstop_holes();

		if (add_strength)
		{
			for (i=[0:5])
			translate([-axis_diameter_larger+2,5+2.5+5*i,-axis_diameter_larger]) 
			cylinder(h=7,r=0.4,$fn=6,center=true);

			for (i=[0:6])
			translate([-axis_diameter_larger-2,5+5*i,-axis_diameter_larger])
			cylinder(h=7,r=0.4,$fn=6,center=true);
		}

		if (!closed_end)
		{
			translate([0,xend_length-1.5-solid_end_width,0])
			cylinder(r=m3_diameter/2, h=xend_height+2,$fn=12,center=true);
		}
	}
}

module xend(endstop_mount=false,closed_end=true,curved_sides=false,override_height=-1,luu_version=false)
{
//	translate([0,9.5,0])bushing(true,13);
//	translate([0,4.8,0.5])cube(size = [8,2,1],center=true);
//	translate([0,4.8,12.5])cube(size = [8,2,1],center=true);
//	translate([0,9.5,48])bushing(true,13);
//	translate([0,4.8,48+0.5])cube(size = [8,2,1],center=true);
//	translate([0,4.8,48+12.5])cube(size = [8,2,1],center=true);
//	translate([0,9.5,32])
//	{
//		difference()
//		{
//			bushing(true,16);
//			translate([0,3,2]) 
//			rotate([45,0,0])
//			cube([16,30,16],center=true);
//		}
//	}
	z_linear_bearings(luu_version=luu_version,override_height=override_height);

	difference()
	{
		union ()
		{
			translate(v = [0,-25,xend_height/2])
			{
				xend_side(closed_end=closed_end,curved_sides=curved_sides);
				mirror([1,0,0]) 
				xend_side(closed_end=closed_end,curved_sides=curved_sides,
					endstop_mount=endstop_mount);
			}	

			// Slider.
//			translate([0,6.5,30]) 
//			cube([15.5+2*thin_wall,17,60],center=true);

			//Nut Trap
			translate([0,-20,0]) 
			cylinder(h=40,r=m8_nut_diameter/2+thin_wall*corection,$fn=6);
		}

		// Slider cutout. 
		translate([0,10,32.5]) 
		cube([22.5,22.5,70],center=true);

		//Rod hole.
		difference()
		{
			translate([0,-20,39.5]) 
			cylinder(h=90,r=m8_nut_diameter/2,$fn=6,center=true);
			translate([0,-20,8.5]) 
			cylinder(h=4,r=m8_nut_diameter/2+thin_wall,$fn=6,center=true);
		}
		translate([0,-20,52]) 
		cylinder(h=90,r=m8_diameter/2,$fn=9,center=true);
	}
}

endstop_thickness=3; 
endstop_w=14;
endstop_l=17;
endstop_h=18;

module endstop_mount()
{
	// Endstop mount 
	translate([-endstop_w+xend_height/2,0,0])
	cube([endstop_w,endstop_l,endstop_h]);
}

module endstop_holes()
{
	translate([-endstop_w+xend_height/2,0,0])
	translate([endstop_thickness,-1,1.2*m8_diameter/2+0.4])
	cube([endstop_w-endstop_thickness+1,endstop_l-endstop_thickness+1,endstop_h]);
	
	for(i=[0:1])
	{
		translate([0,-2.8,2.8])
		translate((i==0)?
			[0,0,0]:
			[0,-10.3,22.2])
		translate([-endstop_w+xend_height/2-1,endstop_l-endstop_thickness,1.2*m8_diameter/2+0.4])
		rotate([0,90,0])
		{
			rotate(180/8)
			cylinder(r=m3_diameter/2,h=endstop_thickness+2,$fn=8);
			rotate(180/6)
			cylinder(r=m3_nut_diameter/2,h=3,$fn=6);
		}
	}
}

module xendcorners(dia1, dia2, dia3, dia4, height=0)
{
	translate([0,35,24.5]) 
	union()
	{ 
		//round corners
		translate([33.1,-60.1,-25]) rotate([0,0,90]) roundcorner(dia1);
		translate([33.1,-19.9,-25]) rotate([0,0,-180]) roundcorner(dia2);
		translate([-33.1,-60.1,-25]) rotate([0,0,0]) roundcorner(dia3);
		translate([-33.1,-19.9,-25]) rotate([0,0,-90]) roundcorner(dia4);
	}
}
//xendcorners(5,5,5,5,0);

xend(endstop_mount=true,closed_end=false,curved_sides=true,override_height=65,luu_version=true);
